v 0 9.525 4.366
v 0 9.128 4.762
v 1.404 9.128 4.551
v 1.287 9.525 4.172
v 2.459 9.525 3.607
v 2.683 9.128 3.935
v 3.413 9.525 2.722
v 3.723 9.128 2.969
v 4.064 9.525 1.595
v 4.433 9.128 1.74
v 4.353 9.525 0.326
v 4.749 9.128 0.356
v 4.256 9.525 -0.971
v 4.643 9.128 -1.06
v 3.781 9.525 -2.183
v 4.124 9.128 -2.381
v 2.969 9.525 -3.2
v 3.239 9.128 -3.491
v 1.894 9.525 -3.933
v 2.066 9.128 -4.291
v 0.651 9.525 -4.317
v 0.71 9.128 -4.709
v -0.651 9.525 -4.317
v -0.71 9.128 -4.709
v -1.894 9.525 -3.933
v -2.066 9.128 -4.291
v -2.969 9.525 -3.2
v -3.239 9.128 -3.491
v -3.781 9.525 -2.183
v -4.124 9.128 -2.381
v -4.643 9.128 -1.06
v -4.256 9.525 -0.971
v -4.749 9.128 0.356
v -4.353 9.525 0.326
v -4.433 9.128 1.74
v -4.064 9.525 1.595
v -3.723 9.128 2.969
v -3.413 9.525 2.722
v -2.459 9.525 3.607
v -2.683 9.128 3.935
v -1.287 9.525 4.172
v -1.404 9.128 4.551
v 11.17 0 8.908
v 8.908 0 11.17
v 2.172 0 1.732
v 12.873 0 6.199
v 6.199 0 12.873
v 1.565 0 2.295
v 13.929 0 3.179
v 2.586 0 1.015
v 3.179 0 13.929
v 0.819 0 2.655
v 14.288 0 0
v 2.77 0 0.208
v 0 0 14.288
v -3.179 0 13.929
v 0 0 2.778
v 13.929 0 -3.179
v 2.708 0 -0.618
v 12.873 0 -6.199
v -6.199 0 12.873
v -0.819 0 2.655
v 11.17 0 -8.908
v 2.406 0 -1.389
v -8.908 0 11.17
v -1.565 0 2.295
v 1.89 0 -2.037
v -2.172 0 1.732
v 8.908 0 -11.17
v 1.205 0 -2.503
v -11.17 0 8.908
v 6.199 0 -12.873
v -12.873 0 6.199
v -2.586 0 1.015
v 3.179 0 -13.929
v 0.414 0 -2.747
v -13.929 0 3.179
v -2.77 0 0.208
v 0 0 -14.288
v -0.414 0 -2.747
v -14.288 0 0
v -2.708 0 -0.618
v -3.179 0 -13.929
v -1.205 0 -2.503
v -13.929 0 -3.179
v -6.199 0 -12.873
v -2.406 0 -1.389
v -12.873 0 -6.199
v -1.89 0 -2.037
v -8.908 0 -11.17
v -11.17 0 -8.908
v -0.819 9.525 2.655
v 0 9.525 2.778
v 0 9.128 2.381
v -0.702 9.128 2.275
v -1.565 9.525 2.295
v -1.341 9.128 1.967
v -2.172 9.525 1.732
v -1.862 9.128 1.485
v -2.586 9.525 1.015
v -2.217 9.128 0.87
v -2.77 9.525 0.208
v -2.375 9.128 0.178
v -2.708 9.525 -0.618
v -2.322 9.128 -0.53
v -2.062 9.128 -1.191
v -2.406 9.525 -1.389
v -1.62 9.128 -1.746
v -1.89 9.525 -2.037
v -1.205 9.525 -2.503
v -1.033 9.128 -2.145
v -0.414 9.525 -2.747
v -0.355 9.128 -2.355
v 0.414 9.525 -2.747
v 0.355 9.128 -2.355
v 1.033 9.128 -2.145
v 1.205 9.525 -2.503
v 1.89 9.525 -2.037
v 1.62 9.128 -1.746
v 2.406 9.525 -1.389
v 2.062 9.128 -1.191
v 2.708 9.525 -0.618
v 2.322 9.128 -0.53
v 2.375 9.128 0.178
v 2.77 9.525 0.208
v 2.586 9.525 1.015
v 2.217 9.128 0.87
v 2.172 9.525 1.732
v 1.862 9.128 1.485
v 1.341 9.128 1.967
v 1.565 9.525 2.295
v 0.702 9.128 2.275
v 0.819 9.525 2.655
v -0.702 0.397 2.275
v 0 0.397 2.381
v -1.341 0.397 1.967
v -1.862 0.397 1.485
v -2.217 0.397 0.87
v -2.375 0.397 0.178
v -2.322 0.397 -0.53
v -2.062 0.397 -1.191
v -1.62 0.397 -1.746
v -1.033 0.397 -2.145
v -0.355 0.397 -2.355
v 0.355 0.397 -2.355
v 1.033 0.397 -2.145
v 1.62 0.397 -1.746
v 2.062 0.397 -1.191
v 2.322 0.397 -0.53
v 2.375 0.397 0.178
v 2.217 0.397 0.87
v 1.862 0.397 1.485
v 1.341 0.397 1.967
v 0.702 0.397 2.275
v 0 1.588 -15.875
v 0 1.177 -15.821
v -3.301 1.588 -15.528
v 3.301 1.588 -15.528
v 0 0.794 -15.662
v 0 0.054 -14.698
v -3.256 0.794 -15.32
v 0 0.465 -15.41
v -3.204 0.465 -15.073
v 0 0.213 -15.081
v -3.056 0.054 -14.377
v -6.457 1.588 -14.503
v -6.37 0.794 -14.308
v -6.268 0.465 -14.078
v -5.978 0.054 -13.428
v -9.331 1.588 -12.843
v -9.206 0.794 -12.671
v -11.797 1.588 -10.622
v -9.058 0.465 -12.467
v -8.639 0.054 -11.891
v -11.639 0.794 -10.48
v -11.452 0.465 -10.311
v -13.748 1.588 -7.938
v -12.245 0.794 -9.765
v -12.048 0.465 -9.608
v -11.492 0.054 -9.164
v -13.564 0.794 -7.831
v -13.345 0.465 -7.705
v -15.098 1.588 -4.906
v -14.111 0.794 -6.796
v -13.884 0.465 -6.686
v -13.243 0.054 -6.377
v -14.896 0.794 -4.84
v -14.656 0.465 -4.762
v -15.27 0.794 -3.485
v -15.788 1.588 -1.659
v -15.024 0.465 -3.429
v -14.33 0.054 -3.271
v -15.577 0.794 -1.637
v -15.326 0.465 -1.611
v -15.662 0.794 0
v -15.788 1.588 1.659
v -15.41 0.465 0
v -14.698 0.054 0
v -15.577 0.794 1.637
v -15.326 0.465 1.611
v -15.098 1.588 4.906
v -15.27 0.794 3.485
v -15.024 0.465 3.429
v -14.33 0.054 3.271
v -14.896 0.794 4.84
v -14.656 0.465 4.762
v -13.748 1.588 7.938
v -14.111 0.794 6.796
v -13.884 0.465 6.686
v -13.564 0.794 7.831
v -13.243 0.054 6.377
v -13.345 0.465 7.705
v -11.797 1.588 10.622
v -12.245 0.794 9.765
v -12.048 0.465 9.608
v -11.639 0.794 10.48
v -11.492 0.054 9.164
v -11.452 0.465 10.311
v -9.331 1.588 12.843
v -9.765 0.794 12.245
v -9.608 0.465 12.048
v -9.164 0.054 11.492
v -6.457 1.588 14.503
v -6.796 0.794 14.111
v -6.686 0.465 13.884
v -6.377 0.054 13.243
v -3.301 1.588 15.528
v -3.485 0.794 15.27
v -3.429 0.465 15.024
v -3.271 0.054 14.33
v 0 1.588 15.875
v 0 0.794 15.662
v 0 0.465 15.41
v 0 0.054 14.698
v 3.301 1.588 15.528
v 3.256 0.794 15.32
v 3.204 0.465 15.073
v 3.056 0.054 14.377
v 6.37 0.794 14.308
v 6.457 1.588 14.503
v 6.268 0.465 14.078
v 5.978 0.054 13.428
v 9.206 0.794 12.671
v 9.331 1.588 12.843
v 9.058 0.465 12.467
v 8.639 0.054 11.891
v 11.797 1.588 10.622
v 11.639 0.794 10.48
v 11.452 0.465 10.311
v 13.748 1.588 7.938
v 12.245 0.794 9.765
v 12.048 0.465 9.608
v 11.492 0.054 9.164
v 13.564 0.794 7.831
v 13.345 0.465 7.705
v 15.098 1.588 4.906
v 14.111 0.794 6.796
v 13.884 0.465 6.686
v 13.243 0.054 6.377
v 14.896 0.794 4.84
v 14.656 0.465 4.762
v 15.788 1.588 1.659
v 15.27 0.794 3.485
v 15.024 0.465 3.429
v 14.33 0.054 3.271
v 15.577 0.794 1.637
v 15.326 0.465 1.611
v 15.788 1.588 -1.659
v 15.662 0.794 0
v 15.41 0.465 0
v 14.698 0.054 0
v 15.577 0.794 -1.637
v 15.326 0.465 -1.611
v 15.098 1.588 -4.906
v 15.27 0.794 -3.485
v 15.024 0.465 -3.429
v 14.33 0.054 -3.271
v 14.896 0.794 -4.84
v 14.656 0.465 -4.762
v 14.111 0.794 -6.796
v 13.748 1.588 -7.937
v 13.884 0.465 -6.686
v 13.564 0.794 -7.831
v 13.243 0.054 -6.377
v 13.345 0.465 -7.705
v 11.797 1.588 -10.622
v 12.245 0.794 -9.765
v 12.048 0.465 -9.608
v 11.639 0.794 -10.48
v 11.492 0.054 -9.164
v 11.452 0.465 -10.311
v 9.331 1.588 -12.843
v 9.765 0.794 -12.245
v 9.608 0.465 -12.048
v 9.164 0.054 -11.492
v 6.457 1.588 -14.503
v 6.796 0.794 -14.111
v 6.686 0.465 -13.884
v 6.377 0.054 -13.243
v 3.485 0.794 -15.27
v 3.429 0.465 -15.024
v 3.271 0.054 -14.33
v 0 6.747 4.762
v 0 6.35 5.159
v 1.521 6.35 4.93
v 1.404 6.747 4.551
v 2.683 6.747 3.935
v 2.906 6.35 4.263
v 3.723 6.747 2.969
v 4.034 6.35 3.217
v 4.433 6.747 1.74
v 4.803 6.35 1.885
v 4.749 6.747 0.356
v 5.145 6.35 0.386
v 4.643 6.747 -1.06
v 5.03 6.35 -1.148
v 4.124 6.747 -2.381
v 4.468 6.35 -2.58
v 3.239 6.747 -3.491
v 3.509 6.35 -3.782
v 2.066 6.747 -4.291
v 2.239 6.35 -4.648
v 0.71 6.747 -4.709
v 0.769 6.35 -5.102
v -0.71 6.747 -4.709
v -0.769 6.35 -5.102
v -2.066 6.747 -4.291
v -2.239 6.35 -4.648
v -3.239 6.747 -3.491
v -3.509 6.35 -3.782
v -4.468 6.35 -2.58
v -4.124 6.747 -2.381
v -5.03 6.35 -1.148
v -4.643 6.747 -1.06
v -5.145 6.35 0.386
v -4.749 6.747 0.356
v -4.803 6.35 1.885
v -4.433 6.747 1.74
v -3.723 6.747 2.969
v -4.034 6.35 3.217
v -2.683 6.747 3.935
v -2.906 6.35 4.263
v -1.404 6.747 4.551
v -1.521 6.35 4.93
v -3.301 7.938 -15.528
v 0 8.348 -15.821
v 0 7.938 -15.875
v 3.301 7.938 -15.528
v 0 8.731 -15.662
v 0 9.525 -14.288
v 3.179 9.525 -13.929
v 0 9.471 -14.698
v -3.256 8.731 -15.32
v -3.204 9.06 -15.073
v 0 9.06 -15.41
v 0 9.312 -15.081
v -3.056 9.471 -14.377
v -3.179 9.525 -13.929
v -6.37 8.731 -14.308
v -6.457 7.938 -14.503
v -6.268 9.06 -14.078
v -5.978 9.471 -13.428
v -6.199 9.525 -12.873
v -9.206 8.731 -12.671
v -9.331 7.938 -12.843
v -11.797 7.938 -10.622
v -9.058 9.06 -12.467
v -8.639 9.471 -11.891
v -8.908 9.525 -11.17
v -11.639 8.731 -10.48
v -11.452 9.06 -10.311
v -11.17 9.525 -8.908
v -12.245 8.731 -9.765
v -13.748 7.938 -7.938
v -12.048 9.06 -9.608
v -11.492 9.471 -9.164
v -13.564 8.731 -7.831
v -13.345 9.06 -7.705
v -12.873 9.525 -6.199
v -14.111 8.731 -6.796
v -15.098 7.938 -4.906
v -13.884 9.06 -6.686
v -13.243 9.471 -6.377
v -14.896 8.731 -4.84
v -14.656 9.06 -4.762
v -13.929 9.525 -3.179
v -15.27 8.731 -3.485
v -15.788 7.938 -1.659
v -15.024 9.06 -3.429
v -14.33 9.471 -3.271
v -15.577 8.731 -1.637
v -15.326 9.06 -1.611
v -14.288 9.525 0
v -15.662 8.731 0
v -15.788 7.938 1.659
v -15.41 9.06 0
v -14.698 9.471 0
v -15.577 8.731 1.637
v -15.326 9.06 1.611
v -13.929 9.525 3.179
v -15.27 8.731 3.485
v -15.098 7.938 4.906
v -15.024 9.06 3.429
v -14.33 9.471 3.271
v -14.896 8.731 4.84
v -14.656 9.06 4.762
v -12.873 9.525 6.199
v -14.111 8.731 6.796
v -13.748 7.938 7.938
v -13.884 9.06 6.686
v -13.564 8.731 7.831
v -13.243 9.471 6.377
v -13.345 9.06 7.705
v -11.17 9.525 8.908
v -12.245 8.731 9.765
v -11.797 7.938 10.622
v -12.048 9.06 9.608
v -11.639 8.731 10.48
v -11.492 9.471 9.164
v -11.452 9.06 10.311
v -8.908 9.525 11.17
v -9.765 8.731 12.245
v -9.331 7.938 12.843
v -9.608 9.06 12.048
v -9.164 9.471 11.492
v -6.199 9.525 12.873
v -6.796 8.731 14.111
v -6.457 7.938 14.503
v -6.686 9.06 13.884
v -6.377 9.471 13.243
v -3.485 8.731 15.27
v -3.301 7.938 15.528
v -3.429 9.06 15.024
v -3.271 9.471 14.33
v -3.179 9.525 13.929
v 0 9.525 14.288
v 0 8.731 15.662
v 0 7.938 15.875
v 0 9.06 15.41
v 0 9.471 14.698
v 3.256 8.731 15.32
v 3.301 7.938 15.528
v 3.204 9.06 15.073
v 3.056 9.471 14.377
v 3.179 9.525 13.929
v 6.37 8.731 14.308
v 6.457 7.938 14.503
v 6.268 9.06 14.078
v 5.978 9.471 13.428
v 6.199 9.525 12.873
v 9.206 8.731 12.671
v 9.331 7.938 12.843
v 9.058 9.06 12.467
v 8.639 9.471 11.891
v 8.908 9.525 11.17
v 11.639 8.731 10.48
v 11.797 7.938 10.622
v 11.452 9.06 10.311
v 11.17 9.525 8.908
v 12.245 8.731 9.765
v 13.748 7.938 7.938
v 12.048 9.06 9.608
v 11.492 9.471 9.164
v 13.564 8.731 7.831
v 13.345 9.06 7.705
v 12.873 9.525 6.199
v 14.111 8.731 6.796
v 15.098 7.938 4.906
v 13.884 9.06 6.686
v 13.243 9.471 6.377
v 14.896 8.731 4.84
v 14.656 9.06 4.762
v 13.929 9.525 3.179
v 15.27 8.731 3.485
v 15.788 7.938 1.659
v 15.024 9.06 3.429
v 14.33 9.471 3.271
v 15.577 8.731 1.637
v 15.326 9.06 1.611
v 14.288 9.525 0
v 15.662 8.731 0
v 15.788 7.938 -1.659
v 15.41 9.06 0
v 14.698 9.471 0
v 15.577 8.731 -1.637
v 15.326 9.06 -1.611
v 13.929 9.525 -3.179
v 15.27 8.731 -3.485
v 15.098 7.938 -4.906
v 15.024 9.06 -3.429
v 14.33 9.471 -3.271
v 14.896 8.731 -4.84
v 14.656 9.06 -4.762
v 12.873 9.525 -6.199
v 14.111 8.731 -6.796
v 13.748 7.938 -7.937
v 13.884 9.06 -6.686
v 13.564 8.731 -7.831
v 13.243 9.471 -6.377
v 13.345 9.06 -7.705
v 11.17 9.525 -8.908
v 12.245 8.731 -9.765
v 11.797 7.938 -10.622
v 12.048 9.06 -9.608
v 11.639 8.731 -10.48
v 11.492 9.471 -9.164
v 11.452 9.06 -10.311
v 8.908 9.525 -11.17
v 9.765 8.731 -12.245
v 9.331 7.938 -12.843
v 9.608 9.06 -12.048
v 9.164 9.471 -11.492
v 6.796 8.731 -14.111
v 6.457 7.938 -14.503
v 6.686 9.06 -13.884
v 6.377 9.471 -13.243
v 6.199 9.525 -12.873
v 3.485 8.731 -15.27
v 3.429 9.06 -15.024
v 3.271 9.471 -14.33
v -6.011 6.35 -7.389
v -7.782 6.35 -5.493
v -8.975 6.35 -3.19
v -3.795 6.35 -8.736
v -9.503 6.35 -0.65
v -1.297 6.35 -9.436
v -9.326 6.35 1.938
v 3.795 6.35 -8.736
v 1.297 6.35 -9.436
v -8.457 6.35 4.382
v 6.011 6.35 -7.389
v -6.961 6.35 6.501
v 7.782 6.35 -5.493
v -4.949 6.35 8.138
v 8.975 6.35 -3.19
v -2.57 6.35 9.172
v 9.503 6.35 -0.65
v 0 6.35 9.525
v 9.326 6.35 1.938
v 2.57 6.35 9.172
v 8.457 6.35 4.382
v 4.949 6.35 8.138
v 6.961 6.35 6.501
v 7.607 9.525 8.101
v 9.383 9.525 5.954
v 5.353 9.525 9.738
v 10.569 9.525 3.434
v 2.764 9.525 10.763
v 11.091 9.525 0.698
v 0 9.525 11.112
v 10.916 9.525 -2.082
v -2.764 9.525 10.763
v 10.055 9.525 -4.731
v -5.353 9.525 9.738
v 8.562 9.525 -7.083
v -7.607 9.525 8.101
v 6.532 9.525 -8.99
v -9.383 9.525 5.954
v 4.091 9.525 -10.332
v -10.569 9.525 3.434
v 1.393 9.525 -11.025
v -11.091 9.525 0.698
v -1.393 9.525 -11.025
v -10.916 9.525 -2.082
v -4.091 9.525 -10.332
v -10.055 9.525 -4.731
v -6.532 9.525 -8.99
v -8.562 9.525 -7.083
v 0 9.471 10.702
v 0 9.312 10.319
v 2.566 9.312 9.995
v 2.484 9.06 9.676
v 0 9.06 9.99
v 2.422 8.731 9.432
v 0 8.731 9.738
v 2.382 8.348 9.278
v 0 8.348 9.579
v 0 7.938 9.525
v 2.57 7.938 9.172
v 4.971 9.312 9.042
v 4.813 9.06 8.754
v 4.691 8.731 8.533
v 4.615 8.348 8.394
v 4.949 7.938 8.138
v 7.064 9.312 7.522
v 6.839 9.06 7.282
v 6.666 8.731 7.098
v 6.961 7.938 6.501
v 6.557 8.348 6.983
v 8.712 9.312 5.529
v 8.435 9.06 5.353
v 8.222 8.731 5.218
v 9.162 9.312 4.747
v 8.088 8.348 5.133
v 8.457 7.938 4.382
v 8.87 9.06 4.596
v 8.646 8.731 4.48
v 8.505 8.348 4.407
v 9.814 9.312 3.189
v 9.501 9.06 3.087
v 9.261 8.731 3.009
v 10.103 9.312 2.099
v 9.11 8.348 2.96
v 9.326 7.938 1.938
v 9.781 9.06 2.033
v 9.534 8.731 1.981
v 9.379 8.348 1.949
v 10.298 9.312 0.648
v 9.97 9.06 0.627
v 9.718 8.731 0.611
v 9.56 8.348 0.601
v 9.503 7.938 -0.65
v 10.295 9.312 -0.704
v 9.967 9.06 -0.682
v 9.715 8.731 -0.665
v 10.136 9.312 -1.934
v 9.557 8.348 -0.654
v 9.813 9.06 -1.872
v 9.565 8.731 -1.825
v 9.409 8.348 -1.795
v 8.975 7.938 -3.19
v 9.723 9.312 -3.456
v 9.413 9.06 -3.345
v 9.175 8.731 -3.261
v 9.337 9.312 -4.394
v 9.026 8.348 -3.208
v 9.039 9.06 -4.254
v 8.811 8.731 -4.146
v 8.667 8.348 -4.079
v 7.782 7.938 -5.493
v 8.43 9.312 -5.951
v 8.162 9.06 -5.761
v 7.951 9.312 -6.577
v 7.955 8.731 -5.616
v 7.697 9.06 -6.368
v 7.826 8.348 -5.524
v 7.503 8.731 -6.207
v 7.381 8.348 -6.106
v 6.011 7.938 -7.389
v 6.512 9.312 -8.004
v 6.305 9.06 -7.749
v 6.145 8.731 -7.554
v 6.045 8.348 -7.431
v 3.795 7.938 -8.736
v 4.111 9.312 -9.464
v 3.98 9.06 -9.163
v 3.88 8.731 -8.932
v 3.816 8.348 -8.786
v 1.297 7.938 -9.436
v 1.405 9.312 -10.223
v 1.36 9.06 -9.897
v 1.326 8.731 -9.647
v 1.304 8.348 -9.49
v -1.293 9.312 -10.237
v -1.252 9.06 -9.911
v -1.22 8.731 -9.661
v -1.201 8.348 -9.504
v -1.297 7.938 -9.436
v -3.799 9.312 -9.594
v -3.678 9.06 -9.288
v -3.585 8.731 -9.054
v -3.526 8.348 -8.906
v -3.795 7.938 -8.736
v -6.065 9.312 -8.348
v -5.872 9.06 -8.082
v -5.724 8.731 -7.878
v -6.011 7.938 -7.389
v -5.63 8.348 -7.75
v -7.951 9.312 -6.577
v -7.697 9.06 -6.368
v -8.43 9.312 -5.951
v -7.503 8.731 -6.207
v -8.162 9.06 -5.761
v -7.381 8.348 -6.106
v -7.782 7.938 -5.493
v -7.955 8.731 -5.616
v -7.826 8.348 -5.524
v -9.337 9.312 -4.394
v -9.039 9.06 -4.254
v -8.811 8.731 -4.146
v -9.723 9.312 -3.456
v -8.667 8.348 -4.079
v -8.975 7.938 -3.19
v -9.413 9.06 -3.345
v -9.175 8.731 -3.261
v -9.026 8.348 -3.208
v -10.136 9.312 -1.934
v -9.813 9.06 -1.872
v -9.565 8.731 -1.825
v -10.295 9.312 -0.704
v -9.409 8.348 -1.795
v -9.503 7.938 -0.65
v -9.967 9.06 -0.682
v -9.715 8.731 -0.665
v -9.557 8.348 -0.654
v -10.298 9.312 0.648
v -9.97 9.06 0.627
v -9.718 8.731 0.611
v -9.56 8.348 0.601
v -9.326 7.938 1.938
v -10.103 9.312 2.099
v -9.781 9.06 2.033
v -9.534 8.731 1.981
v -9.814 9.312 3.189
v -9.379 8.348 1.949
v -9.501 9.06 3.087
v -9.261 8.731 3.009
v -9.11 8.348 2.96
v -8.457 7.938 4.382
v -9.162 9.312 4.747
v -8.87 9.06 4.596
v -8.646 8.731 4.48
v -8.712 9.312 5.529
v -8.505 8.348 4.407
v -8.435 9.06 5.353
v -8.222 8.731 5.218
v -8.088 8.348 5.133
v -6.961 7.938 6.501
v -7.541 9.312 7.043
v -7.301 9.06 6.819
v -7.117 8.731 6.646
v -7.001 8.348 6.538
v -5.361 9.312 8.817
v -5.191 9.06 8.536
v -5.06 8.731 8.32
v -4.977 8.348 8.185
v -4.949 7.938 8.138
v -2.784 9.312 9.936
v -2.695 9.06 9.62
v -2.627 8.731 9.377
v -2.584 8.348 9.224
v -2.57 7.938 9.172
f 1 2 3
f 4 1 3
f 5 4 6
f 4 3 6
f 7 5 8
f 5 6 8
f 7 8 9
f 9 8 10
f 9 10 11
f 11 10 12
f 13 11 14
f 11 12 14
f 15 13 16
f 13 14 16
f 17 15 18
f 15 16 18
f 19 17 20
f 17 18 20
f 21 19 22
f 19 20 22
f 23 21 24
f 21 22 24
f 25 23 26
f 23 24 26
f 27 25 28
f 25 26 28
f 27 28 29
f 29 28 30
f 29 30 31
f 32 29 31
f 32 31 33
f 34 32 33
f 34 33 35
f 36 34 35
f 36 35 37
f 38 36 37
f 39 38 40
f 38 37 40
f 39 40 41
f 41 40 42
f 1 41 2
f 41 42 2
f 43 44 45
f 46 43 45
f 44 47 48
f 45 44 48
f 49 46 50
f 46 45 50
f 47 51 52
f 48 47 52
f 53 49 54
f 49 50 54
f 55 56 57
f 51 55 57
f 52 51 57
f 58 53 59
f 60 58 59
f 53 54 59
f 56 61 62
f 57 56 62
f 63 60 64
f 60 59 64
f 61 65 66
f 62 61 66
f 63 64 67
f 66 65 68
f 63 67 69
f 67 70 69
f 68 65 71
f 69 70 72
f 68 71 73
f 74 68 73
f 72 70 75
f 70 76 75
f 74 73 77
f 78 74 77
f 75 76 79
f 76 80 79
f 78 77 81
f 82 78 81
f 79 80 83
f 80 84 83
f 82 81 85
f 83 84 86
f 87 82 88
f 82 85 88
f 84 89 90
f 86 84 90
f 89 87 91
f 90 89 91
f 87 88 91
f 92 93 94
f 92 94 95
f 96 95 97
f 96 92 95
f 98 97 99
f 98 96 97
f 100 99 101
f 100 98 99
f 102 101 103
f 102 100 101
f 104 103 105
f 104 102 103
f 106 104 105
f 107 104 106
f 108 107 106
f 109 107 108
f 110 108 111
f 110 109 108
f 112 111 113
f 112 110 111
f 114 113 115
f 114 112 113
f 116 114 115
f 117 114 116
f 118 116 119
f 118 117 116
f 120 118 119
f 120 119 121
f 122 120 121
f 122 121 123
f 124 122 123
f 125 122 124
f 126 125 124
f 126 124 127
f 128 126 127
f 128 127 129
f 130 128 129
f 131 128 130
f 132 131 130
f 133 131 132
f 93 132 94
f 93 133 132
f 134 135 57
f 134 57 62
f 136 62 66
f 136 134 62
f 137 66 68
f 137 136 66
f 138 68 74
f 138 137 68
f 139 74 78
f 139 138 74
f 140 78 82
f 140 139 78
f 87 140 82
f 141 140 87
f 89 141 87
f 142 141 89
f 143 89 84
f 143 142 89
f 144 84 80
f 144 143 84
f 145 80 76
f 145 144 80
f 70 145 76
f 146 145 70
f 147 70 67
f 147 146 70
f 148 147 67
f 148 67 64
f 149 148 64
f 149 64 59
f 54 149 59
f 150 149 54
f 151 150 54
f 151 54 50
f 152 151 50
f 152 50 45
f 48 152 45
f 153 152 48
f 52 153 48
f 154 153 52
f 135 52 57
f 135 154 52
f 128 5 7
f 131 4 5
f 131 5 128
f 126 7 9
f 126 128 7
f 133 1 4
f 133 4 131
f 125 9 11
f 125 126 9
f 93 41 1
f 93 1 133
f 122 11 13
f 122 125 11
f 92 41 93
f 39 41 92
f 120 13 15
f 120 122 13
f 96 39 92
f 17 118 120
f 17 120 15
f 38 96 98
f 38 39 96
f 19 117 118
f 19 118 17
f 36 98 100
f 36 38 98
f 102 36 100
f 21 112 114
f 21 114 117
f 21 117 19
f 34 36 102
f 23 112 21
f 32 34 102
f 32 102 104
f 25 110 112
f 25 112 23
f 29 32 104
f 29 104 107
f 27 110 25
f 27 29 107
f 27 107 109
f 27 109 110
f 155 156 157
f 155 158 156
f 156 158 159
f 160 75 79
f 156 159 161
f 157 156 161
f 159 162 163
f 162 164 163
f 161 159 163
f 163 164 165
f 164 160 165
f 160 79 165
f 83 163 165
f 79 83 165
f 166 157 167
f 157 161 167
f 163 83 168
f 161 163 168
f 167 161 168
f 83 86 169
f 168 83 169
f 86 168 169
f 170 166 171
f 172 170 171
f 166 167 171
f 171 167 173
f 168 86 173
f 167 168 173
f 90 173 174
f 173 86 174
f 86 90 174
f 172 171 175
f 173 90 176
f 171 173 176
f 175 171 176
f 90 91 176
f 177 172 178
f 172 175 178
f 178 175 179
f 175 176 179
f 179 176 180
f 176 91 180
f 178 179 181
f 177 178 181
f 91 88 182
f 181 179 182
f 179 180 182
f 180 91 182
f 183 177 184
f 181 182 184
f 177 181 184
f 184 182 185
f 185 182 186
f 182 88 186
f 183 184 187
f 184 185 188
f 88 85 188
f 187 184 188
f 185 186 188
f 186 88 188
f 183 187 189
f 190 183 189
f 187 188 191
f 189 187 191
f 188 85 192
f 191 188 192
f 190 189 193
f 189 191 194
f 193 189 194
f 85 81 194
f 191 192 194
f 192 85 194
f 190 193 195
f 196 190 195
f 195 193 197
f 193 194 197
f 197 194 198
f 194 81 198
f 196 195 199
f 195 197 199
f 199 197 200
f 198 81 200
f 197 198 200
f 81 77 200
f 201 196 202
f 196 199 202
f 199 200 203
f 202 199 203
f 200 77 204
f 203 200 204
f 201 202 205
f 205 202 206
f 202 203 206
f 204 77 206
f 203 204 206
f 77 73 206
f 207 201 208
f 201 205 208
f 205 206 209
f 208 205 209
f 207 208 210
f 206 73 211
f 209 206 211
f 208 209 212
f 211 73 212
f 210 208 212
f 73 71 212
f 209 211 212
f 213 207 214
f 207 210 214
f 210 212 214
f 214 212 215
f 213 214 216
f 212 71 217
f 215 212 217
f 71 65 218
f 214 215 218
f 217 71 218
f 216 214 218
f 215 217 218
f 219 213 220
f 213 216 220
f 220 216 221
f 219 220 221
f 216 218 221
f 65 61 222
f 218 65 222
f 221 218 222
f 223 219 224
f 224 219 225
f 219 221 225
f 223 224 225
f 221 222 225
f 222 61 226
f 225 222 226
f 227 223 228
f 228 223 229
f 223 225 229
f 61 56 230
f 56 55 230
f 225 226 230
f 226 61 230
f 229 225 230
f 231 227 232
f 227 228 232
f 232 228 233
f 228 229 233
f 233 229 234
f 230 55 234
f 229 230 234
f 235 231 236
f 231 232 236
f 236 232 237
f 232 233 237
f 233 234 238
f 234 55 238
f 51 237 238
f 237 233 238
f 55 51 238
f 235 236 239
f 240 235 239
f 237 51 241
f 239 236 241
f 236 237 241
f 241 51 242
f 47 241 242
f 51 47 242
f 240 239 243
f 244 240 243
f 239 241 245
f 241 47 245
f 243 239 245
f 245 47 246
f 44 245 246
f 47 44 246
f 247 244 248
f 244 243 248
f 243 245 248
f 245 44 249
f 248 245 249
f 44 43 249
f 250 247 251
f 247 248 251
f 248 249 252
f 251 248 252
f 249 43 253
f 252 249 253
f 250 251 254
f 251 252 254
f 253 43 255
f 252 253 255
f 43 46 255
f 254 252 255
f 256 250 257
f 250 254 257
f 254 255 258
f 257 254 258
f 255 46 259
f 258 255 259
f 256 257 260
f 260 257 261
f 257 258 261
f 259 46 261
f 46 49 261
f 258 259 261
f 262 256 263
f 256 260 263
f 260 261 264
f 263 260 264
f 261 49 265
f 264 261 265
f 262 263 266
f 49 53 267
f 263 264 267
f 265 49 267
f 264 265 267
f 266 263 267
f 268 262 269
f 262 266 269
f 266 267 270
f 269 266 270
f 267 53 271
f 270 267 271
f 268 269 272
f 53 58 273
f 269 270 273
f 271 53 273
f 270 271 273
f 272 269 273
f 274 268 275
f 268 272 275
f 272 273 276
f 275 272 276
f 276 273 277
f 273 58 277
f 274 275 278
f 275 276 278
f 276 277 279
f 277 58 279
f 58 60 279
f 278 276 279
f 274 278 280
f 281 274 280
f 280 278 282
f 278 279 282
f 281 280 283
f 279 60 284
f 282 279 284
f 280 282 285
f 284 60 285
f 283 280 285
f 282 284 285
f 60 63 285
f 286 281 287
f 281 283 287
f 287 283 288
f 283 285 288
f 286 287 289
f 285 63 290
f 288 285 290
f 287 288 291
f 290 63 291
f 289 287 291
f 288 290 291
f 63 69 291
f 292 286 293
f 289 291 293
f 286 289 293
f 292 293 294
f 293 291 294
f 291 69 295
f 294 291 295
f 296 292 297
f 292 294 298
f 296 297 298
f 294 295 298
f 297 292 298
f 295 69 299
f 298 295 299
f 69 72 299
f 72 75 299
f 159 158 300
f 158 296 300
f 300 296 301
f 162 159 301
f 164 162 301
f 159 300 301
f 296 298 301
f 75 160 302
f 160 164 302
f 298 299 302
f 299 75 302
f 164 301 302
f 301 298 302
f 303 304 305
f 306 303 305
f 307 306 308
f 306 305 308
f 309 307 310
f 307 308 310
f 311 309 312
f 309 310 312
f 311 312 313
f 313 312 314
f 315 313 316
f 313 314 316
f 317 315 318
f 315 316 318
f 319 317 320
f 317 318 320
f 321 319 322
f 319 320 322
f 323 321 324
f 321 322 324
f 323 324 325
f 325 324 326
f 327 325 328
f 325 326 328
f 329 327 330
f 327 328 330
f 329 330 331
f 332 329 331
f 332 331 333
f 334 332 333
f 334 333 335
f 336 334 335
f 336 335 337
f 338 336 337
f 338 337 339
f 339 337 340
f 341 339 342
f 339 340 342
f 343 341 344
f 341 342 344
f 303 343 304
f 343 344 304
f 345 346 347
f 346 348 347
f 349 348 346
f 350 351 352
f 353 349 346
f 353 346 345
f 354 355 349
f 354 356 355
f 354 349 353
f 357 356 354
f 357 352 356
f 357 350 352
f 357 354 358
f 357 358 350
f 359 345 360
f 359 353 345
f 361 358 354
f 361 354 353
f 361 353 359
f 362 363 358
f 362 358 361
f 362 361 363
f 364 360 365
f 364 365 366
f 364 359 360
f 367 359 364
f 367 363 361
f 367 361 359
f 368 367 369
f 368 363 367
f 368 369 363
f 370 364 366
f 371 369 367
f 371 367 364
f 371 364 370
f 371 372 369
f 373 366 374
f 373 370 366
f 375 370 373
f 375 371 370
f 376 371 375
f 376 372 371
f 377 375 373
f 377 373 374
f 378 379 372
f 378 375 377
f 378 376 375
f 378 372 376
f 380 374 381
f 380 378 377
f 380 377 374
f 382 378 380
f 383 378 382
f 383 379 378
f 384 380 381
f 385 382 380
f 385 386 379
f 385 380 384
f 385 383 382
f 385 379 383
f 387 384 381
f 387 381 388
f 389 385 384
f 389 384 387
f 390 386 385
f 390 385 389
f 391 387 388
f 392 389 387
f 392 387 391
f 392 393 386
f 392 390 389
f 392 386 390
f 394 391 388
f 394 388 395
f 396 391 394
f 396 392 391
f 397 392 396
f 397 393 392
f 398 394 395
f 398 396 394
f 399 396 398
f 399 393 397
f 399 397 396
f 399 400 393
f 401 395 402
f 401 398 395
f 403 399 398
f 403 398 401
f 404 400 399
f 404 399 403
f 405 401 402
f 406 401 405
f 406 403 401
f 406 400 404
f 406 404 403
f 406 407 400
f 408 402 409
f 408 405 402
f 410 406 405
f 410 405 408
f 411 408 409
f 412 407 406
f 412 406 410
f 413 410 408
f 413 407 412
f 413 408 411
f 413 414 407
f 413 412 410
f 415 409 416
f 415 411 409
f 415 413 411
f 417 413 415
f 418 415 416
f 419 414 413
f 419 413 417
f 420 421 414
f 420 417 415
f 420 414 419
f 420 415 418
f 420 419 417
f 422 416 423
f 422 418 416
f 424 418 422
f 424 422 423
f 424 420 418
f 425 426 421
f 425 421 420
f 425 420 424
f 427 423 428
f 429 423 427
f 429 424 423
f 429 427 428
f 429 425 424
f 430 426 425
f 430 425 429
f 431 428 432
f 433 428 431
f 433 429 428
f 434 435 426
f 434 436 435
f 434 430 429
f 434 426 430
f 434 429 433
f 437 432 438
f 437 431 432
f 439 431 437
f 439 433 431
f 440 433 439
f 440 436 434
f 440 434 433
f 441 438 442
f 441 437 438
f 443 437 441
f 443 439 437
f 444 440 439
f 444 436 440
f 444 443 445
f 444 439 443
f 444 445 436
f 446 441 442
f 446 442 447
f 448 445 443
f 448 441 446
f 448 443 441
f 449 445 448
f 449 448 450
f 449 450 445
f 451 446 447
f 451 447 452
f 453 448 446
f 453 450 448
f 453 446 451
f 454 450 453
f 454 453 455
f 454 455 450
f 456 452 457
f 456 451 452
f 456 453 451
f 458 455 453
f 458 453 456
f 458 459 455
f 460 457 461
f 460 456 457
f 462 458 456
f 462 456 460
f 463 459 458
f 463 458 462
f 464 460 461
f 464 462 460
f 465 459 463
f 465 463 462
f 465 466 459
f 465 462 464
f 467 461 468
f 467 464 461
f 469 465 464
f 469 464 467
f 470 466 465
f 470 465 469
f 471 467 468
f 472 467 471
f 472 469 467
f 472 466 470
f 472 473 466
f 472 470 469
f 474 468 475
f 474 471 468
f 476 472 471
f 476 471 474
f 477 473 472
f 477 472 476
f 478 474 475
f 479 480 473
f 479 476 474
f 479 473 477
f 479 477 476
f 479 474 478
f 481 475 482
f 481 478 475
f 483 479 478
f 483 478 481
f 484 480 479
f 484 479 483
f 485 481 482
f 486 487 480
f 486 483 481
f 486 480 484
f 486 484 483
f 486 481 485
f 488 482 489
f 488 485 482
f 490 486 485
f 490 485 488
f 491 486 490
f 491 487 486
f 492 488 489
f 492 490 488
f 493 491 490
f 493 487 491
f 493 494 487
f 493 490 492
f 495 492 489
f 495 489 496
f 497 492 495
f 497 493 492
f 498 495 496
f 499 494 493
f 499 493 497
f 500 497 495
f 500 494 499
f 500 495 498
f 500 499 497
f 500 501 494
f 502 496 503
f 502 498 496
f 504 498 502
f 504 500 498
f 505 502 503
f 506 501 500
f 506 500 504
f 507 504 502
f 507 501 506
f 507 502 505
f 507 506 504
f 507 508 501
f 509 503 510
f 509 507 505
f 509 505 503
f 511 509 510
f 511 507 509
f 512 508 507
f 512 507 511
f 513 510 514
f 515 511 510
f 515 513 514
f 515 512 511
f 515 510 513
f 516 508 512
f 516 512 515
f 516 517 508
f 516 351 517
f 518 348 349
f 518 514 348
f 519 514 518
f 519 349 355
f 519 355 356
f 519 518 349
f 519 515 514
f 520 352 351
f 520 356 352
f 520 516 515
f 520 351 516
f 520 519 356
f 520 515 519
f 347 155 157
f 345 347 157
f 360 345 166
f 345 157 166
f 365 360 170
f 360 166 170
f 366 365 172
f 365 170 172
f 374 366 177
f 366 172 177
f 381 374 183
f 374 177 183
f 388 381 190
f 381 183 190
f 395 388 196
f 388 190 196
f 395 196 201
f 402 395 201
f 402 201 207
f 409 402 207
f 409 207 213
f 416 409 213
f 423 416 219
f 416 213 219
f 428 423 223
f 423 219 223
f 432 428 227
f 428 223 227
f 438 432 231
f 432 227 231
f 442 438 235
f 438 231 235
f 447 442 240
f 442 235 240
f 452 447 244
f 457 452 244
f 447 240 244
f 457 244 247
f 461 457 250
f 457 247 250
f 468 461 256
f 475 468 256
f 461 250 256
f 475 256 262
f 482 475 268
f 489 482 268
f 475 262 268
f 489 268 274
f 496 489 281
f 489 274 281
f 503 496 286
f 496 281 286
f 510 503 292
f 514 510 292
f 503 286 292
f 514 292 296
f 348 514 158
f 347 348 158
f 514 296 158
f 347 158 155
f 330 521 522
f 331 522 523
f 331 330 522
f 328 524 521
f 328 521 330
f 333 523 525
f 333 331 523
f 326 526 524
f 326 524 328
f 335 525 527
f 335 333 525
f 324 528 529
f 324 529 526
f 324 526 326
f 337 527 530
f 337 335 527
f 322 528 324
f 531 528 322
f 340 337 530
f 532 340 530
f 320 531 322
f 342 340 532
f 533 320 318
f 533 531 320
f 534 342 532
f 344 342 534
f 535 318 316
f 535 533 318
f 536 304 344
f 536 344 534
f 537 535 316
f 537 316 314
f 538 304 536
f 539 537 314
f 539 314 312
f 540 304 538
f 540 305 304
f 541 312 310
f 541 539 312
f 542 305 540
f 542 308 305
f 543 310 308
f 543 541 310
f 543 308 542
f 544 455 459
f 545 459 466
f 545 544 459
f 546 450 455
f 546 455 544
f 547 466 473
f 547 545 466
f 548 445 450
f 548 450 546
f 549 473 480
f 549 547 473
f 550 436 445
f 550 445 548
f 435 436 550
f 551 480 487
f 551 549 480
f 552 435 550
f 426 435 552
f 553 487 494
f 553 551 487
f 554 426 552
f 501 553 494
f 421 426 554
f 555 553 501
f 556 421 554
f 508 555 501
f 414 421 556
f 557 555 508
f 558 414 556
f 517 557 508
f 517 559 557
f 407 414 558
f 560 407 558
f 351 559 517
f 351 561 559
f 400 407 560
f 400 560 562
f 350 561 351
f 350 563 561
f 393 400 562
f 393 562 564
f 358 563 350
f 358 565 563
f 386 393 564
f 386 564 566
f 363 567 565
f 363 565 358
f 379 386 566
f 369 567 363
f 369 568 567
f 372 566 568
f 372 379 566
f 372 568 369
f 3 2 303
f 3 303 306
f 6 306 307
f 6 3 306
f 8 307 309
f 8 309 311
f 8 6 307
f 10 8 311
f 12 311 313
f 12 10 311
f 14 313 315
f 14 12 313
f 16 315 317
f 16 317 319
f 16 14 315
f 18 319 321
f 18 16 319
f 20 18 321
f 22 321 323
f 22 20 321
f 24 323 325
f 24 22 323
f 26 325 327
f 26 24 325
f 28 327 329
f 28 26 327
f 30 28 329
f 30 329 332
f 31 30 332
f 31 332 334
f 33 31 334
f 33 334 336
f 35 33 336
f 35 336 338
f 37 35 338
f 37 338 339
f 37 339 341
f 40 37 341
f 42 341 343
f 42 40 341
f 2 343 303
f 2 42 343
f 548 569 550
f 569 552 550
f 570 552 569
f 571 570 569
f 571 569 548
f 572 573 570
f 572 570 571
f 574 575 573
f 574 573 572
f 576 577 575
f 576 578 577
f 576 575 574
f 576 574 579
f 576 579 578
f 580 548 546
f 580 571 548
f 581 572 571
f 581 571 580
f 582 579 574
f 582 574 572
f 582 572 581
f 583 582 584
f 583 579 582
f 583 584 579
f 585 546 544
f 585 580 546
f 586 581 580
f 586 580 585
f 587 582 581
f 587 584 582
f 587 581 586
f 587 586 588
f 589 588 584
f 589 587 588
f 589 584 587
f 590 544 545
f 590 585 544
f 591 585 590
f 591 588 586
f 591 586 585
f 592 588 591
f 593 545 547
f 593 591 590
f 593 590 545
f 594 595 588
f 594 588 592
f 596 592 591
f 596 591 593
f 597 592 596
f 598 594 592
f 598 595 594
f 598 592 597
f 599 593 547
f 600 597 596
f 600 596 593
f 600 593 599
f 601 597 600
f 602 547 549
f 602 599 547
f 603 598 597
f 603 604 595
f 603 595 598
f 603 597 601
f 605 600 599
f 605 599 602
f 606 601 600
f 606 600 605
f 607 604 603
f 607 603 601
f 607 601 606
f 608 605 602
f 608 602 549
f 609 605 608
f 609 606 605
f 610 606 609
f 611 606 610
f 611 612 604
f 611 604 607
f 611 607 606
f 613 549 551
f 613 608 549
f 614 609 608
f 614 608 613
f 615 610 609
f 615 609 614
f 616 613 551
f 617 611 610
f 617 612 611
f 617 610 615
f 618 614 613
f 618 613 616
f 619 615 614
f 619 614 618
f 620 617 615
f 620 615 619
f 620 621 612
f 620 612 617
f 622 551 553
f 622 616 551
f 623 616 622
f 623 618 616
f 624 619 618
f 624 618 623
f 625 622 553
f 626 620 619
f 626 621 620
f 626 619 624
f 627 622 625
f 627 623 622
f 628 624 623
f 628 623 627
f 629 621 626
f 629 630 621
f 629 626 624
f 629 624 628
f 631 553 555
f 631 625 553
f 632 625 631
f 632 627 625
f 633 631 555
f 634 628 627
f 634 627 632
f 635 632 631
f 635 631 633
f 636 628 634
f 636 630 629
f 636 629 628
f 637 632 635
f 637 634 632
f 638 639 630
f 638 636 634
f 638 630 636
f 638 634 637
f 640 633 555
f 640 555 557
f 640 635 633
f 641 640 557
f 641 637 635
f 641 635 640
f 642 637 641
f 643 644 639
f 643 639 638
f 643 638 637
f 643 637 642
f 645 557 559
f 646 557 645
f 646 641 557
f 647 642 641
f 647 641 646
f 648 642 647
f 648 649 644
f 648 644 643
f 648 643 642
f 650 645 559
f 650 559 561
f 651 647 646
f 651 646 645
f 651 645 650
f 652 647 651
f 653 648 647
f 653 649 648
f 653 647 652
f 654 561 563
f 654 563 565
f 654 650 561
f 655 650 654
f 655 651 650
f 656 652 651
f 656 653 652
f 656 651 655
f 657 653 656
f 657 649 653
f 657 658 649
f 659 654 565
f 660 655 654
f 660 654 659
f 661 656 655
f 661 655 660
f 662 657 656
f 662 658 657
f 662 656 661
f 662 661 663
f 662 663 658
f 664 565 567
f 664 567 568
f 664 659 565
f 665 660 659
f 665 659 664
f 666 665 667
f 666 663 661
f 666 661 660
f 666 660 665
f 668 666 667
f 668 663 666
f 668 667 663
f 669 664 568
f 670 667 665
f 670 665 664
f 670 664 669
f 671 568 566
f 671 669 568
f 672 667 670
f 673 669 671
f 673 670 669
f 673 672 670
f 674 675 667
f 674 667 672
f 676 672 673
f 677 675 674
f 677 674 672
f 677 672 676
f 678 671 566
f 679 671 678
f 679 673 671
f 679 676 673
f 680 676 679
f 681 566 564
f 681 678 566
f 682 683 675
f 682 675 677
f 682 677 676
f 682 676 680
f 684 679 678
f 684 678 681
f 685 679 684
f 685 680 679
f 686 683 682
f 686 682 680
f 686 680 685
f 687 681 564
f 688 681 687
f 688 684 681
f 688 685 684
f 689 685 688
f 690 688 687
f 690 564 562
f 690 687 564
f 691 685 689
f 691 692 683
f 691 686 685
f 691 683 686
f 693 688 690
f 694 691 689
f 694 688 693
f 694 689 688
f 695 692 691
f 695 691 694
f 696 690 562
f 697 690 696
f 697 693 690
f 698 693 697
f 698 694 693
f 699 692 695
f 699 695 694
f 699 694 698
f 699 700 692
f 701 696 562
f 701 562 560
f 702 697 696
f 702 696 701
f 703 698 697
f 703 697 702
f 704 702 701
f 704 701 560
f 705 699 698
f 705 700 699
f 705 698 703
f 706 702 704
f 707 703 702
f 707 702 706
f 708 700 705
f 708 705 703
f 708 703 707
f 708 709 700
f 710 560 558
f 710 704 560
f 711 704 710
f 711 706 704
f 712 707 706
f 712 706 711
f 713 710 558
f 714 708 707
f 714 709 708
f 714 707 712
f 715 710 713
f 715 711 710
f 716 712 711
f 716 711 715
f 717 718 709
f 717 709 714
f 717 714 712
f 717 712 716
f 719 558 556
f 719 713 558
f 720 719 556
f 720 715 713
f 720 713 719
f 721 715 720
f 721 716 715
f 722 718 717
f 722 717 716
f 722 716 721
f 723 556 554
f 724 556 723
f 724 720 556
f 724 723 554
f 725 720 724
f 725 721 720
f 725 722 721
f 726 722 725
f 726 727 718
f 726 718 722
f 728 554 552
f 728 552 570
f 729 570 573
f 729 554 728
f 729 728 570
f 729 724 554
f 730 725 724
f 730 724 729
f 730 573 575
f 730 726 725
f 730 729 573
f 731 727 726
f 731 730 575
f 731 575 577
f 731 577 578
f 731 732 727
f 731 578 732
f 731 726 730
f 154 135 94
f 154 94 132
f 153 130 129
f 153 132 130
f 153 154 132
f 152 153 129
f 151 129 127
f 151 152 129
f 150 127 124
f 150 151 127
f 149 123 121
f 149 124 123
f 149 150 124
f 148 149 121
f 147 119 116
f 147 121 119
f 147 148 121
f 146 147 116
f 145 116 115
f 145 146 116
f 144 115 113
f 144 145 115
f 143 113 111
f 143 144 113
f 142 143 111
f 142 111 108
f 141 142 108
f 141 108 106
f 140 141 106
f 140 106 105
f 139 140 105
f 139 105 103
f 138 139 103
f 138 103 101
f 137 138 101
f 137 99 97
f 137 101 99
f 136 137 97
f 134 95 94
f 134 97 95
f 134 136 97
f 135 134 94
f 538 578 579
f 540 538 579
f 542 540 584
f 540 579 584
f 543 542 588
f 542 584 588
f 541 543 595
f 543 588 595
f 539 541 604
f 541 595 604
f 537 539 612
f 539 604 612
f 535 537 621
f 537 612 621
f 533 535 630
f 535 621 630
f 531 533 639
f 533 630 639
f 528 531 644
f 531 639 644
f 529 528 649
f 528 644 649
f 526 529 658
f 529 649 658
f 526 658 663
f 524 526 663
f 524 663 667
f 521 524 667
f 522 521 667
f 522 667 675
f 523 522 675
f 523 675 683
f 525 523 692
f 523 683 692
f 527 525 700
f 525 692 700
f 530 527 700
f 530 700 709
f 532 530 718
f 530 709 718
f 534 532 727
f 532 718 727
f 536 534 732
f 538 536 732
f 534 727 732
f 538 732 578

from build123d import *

# Parameters (mm, degrees)
SKETCH1_R               = 15.875
BOSS_EXTRUDE1_DEPTH     = 9.525
SKETCH2_R               = 9.525
SKETCH2_R_2             = 4.7625
CUT_EXTRUDE1_DEPTH      = 3.175
CUT_EXTRUDE2_DEPTH      = 25.387637749
CUT_EXTRUDE2_DEPTH_BACK = 25.387637749
SKETCH3_R               = 2.38125
FILLET2_R               = 1.5875
CHAMFER2_SIZE           = 0.396875


with BuildPart() as part:
    # Sketch1 → Boss-Extrude1 (new body)
    with BuildSketch(Plane(origin=(0, 0, 0), x_dir=(1, 0, 0), z_dir=(0, 1, 0))):
        with Locations(Location((0, 0, 0), (0, 0, 90))):
            Circle(SKETCH1_R)
    extrude(amount=BOSS_EXTRUDE1_DEPTH)

    # Sketch2 → Cut-Extrude1 (cut)
    with BuildSketch(Plane(origin=(0, 9.525, 0), x_dir=(1, 0, 0), z_dir=(0, 1, 0))):
        with Locations(Location((0, 0, 0), (0, 0, 270))):
            Circle(SKETCH2_R)
        with Locations(Location((0, 0, 0), (0, 0, 270))):
            Circle(SKETCH2_R_2, mode=Mode.SUBTRACT)
    extrude(amount=-CUT_EXTRUDE1_DEPTH, mode=Mode.SUBTRACT)

    # Sketch3 → Cut-Extrude2 (cut, two sides: drawn at the far end of the back side and taken through both)
    with BuildSketch(Plane(origin=(0, 9.525, 0), x_dir=(1, 0, 0), z_dir=(0, 1, 0)).offset(-CUT_EXTRUDE2_DEPTH_BACK)):
        with Locations(Location((0, 0, 0), (0, 0, 270))):
            Circle(SKETCH3_R)
    extrude(amount=CUT_EXTRUDE2_DEPTH + CUT_EXTRUDE2_DEPTH_BACK, mode=Mode.SUBTRACT)

    # Fillet2
    fillet2_edges = [part.edges().sort_by_distance(p)[0] for p in [
        (0, 0, 15.875),
        (0, 9.525, 15.875),
        (0, 9.525, -9.525),
    ]]
    fillet(fillet2_edges, radius=FILLET2_R)

    # Chamfer2
    chamfer2_edges = [part.edges().sort_by_distance(p)[0] for p in [
        (0, 9.525, -2.38125),
        (0, 0, -2.38125),
        (0, 6.35, -4.7625),
        (0, 9.525, -4.7625),
    ]]
    chamfer(chamfer2_edges, length=CHAMFER2_SIZE)


solid = part.part
